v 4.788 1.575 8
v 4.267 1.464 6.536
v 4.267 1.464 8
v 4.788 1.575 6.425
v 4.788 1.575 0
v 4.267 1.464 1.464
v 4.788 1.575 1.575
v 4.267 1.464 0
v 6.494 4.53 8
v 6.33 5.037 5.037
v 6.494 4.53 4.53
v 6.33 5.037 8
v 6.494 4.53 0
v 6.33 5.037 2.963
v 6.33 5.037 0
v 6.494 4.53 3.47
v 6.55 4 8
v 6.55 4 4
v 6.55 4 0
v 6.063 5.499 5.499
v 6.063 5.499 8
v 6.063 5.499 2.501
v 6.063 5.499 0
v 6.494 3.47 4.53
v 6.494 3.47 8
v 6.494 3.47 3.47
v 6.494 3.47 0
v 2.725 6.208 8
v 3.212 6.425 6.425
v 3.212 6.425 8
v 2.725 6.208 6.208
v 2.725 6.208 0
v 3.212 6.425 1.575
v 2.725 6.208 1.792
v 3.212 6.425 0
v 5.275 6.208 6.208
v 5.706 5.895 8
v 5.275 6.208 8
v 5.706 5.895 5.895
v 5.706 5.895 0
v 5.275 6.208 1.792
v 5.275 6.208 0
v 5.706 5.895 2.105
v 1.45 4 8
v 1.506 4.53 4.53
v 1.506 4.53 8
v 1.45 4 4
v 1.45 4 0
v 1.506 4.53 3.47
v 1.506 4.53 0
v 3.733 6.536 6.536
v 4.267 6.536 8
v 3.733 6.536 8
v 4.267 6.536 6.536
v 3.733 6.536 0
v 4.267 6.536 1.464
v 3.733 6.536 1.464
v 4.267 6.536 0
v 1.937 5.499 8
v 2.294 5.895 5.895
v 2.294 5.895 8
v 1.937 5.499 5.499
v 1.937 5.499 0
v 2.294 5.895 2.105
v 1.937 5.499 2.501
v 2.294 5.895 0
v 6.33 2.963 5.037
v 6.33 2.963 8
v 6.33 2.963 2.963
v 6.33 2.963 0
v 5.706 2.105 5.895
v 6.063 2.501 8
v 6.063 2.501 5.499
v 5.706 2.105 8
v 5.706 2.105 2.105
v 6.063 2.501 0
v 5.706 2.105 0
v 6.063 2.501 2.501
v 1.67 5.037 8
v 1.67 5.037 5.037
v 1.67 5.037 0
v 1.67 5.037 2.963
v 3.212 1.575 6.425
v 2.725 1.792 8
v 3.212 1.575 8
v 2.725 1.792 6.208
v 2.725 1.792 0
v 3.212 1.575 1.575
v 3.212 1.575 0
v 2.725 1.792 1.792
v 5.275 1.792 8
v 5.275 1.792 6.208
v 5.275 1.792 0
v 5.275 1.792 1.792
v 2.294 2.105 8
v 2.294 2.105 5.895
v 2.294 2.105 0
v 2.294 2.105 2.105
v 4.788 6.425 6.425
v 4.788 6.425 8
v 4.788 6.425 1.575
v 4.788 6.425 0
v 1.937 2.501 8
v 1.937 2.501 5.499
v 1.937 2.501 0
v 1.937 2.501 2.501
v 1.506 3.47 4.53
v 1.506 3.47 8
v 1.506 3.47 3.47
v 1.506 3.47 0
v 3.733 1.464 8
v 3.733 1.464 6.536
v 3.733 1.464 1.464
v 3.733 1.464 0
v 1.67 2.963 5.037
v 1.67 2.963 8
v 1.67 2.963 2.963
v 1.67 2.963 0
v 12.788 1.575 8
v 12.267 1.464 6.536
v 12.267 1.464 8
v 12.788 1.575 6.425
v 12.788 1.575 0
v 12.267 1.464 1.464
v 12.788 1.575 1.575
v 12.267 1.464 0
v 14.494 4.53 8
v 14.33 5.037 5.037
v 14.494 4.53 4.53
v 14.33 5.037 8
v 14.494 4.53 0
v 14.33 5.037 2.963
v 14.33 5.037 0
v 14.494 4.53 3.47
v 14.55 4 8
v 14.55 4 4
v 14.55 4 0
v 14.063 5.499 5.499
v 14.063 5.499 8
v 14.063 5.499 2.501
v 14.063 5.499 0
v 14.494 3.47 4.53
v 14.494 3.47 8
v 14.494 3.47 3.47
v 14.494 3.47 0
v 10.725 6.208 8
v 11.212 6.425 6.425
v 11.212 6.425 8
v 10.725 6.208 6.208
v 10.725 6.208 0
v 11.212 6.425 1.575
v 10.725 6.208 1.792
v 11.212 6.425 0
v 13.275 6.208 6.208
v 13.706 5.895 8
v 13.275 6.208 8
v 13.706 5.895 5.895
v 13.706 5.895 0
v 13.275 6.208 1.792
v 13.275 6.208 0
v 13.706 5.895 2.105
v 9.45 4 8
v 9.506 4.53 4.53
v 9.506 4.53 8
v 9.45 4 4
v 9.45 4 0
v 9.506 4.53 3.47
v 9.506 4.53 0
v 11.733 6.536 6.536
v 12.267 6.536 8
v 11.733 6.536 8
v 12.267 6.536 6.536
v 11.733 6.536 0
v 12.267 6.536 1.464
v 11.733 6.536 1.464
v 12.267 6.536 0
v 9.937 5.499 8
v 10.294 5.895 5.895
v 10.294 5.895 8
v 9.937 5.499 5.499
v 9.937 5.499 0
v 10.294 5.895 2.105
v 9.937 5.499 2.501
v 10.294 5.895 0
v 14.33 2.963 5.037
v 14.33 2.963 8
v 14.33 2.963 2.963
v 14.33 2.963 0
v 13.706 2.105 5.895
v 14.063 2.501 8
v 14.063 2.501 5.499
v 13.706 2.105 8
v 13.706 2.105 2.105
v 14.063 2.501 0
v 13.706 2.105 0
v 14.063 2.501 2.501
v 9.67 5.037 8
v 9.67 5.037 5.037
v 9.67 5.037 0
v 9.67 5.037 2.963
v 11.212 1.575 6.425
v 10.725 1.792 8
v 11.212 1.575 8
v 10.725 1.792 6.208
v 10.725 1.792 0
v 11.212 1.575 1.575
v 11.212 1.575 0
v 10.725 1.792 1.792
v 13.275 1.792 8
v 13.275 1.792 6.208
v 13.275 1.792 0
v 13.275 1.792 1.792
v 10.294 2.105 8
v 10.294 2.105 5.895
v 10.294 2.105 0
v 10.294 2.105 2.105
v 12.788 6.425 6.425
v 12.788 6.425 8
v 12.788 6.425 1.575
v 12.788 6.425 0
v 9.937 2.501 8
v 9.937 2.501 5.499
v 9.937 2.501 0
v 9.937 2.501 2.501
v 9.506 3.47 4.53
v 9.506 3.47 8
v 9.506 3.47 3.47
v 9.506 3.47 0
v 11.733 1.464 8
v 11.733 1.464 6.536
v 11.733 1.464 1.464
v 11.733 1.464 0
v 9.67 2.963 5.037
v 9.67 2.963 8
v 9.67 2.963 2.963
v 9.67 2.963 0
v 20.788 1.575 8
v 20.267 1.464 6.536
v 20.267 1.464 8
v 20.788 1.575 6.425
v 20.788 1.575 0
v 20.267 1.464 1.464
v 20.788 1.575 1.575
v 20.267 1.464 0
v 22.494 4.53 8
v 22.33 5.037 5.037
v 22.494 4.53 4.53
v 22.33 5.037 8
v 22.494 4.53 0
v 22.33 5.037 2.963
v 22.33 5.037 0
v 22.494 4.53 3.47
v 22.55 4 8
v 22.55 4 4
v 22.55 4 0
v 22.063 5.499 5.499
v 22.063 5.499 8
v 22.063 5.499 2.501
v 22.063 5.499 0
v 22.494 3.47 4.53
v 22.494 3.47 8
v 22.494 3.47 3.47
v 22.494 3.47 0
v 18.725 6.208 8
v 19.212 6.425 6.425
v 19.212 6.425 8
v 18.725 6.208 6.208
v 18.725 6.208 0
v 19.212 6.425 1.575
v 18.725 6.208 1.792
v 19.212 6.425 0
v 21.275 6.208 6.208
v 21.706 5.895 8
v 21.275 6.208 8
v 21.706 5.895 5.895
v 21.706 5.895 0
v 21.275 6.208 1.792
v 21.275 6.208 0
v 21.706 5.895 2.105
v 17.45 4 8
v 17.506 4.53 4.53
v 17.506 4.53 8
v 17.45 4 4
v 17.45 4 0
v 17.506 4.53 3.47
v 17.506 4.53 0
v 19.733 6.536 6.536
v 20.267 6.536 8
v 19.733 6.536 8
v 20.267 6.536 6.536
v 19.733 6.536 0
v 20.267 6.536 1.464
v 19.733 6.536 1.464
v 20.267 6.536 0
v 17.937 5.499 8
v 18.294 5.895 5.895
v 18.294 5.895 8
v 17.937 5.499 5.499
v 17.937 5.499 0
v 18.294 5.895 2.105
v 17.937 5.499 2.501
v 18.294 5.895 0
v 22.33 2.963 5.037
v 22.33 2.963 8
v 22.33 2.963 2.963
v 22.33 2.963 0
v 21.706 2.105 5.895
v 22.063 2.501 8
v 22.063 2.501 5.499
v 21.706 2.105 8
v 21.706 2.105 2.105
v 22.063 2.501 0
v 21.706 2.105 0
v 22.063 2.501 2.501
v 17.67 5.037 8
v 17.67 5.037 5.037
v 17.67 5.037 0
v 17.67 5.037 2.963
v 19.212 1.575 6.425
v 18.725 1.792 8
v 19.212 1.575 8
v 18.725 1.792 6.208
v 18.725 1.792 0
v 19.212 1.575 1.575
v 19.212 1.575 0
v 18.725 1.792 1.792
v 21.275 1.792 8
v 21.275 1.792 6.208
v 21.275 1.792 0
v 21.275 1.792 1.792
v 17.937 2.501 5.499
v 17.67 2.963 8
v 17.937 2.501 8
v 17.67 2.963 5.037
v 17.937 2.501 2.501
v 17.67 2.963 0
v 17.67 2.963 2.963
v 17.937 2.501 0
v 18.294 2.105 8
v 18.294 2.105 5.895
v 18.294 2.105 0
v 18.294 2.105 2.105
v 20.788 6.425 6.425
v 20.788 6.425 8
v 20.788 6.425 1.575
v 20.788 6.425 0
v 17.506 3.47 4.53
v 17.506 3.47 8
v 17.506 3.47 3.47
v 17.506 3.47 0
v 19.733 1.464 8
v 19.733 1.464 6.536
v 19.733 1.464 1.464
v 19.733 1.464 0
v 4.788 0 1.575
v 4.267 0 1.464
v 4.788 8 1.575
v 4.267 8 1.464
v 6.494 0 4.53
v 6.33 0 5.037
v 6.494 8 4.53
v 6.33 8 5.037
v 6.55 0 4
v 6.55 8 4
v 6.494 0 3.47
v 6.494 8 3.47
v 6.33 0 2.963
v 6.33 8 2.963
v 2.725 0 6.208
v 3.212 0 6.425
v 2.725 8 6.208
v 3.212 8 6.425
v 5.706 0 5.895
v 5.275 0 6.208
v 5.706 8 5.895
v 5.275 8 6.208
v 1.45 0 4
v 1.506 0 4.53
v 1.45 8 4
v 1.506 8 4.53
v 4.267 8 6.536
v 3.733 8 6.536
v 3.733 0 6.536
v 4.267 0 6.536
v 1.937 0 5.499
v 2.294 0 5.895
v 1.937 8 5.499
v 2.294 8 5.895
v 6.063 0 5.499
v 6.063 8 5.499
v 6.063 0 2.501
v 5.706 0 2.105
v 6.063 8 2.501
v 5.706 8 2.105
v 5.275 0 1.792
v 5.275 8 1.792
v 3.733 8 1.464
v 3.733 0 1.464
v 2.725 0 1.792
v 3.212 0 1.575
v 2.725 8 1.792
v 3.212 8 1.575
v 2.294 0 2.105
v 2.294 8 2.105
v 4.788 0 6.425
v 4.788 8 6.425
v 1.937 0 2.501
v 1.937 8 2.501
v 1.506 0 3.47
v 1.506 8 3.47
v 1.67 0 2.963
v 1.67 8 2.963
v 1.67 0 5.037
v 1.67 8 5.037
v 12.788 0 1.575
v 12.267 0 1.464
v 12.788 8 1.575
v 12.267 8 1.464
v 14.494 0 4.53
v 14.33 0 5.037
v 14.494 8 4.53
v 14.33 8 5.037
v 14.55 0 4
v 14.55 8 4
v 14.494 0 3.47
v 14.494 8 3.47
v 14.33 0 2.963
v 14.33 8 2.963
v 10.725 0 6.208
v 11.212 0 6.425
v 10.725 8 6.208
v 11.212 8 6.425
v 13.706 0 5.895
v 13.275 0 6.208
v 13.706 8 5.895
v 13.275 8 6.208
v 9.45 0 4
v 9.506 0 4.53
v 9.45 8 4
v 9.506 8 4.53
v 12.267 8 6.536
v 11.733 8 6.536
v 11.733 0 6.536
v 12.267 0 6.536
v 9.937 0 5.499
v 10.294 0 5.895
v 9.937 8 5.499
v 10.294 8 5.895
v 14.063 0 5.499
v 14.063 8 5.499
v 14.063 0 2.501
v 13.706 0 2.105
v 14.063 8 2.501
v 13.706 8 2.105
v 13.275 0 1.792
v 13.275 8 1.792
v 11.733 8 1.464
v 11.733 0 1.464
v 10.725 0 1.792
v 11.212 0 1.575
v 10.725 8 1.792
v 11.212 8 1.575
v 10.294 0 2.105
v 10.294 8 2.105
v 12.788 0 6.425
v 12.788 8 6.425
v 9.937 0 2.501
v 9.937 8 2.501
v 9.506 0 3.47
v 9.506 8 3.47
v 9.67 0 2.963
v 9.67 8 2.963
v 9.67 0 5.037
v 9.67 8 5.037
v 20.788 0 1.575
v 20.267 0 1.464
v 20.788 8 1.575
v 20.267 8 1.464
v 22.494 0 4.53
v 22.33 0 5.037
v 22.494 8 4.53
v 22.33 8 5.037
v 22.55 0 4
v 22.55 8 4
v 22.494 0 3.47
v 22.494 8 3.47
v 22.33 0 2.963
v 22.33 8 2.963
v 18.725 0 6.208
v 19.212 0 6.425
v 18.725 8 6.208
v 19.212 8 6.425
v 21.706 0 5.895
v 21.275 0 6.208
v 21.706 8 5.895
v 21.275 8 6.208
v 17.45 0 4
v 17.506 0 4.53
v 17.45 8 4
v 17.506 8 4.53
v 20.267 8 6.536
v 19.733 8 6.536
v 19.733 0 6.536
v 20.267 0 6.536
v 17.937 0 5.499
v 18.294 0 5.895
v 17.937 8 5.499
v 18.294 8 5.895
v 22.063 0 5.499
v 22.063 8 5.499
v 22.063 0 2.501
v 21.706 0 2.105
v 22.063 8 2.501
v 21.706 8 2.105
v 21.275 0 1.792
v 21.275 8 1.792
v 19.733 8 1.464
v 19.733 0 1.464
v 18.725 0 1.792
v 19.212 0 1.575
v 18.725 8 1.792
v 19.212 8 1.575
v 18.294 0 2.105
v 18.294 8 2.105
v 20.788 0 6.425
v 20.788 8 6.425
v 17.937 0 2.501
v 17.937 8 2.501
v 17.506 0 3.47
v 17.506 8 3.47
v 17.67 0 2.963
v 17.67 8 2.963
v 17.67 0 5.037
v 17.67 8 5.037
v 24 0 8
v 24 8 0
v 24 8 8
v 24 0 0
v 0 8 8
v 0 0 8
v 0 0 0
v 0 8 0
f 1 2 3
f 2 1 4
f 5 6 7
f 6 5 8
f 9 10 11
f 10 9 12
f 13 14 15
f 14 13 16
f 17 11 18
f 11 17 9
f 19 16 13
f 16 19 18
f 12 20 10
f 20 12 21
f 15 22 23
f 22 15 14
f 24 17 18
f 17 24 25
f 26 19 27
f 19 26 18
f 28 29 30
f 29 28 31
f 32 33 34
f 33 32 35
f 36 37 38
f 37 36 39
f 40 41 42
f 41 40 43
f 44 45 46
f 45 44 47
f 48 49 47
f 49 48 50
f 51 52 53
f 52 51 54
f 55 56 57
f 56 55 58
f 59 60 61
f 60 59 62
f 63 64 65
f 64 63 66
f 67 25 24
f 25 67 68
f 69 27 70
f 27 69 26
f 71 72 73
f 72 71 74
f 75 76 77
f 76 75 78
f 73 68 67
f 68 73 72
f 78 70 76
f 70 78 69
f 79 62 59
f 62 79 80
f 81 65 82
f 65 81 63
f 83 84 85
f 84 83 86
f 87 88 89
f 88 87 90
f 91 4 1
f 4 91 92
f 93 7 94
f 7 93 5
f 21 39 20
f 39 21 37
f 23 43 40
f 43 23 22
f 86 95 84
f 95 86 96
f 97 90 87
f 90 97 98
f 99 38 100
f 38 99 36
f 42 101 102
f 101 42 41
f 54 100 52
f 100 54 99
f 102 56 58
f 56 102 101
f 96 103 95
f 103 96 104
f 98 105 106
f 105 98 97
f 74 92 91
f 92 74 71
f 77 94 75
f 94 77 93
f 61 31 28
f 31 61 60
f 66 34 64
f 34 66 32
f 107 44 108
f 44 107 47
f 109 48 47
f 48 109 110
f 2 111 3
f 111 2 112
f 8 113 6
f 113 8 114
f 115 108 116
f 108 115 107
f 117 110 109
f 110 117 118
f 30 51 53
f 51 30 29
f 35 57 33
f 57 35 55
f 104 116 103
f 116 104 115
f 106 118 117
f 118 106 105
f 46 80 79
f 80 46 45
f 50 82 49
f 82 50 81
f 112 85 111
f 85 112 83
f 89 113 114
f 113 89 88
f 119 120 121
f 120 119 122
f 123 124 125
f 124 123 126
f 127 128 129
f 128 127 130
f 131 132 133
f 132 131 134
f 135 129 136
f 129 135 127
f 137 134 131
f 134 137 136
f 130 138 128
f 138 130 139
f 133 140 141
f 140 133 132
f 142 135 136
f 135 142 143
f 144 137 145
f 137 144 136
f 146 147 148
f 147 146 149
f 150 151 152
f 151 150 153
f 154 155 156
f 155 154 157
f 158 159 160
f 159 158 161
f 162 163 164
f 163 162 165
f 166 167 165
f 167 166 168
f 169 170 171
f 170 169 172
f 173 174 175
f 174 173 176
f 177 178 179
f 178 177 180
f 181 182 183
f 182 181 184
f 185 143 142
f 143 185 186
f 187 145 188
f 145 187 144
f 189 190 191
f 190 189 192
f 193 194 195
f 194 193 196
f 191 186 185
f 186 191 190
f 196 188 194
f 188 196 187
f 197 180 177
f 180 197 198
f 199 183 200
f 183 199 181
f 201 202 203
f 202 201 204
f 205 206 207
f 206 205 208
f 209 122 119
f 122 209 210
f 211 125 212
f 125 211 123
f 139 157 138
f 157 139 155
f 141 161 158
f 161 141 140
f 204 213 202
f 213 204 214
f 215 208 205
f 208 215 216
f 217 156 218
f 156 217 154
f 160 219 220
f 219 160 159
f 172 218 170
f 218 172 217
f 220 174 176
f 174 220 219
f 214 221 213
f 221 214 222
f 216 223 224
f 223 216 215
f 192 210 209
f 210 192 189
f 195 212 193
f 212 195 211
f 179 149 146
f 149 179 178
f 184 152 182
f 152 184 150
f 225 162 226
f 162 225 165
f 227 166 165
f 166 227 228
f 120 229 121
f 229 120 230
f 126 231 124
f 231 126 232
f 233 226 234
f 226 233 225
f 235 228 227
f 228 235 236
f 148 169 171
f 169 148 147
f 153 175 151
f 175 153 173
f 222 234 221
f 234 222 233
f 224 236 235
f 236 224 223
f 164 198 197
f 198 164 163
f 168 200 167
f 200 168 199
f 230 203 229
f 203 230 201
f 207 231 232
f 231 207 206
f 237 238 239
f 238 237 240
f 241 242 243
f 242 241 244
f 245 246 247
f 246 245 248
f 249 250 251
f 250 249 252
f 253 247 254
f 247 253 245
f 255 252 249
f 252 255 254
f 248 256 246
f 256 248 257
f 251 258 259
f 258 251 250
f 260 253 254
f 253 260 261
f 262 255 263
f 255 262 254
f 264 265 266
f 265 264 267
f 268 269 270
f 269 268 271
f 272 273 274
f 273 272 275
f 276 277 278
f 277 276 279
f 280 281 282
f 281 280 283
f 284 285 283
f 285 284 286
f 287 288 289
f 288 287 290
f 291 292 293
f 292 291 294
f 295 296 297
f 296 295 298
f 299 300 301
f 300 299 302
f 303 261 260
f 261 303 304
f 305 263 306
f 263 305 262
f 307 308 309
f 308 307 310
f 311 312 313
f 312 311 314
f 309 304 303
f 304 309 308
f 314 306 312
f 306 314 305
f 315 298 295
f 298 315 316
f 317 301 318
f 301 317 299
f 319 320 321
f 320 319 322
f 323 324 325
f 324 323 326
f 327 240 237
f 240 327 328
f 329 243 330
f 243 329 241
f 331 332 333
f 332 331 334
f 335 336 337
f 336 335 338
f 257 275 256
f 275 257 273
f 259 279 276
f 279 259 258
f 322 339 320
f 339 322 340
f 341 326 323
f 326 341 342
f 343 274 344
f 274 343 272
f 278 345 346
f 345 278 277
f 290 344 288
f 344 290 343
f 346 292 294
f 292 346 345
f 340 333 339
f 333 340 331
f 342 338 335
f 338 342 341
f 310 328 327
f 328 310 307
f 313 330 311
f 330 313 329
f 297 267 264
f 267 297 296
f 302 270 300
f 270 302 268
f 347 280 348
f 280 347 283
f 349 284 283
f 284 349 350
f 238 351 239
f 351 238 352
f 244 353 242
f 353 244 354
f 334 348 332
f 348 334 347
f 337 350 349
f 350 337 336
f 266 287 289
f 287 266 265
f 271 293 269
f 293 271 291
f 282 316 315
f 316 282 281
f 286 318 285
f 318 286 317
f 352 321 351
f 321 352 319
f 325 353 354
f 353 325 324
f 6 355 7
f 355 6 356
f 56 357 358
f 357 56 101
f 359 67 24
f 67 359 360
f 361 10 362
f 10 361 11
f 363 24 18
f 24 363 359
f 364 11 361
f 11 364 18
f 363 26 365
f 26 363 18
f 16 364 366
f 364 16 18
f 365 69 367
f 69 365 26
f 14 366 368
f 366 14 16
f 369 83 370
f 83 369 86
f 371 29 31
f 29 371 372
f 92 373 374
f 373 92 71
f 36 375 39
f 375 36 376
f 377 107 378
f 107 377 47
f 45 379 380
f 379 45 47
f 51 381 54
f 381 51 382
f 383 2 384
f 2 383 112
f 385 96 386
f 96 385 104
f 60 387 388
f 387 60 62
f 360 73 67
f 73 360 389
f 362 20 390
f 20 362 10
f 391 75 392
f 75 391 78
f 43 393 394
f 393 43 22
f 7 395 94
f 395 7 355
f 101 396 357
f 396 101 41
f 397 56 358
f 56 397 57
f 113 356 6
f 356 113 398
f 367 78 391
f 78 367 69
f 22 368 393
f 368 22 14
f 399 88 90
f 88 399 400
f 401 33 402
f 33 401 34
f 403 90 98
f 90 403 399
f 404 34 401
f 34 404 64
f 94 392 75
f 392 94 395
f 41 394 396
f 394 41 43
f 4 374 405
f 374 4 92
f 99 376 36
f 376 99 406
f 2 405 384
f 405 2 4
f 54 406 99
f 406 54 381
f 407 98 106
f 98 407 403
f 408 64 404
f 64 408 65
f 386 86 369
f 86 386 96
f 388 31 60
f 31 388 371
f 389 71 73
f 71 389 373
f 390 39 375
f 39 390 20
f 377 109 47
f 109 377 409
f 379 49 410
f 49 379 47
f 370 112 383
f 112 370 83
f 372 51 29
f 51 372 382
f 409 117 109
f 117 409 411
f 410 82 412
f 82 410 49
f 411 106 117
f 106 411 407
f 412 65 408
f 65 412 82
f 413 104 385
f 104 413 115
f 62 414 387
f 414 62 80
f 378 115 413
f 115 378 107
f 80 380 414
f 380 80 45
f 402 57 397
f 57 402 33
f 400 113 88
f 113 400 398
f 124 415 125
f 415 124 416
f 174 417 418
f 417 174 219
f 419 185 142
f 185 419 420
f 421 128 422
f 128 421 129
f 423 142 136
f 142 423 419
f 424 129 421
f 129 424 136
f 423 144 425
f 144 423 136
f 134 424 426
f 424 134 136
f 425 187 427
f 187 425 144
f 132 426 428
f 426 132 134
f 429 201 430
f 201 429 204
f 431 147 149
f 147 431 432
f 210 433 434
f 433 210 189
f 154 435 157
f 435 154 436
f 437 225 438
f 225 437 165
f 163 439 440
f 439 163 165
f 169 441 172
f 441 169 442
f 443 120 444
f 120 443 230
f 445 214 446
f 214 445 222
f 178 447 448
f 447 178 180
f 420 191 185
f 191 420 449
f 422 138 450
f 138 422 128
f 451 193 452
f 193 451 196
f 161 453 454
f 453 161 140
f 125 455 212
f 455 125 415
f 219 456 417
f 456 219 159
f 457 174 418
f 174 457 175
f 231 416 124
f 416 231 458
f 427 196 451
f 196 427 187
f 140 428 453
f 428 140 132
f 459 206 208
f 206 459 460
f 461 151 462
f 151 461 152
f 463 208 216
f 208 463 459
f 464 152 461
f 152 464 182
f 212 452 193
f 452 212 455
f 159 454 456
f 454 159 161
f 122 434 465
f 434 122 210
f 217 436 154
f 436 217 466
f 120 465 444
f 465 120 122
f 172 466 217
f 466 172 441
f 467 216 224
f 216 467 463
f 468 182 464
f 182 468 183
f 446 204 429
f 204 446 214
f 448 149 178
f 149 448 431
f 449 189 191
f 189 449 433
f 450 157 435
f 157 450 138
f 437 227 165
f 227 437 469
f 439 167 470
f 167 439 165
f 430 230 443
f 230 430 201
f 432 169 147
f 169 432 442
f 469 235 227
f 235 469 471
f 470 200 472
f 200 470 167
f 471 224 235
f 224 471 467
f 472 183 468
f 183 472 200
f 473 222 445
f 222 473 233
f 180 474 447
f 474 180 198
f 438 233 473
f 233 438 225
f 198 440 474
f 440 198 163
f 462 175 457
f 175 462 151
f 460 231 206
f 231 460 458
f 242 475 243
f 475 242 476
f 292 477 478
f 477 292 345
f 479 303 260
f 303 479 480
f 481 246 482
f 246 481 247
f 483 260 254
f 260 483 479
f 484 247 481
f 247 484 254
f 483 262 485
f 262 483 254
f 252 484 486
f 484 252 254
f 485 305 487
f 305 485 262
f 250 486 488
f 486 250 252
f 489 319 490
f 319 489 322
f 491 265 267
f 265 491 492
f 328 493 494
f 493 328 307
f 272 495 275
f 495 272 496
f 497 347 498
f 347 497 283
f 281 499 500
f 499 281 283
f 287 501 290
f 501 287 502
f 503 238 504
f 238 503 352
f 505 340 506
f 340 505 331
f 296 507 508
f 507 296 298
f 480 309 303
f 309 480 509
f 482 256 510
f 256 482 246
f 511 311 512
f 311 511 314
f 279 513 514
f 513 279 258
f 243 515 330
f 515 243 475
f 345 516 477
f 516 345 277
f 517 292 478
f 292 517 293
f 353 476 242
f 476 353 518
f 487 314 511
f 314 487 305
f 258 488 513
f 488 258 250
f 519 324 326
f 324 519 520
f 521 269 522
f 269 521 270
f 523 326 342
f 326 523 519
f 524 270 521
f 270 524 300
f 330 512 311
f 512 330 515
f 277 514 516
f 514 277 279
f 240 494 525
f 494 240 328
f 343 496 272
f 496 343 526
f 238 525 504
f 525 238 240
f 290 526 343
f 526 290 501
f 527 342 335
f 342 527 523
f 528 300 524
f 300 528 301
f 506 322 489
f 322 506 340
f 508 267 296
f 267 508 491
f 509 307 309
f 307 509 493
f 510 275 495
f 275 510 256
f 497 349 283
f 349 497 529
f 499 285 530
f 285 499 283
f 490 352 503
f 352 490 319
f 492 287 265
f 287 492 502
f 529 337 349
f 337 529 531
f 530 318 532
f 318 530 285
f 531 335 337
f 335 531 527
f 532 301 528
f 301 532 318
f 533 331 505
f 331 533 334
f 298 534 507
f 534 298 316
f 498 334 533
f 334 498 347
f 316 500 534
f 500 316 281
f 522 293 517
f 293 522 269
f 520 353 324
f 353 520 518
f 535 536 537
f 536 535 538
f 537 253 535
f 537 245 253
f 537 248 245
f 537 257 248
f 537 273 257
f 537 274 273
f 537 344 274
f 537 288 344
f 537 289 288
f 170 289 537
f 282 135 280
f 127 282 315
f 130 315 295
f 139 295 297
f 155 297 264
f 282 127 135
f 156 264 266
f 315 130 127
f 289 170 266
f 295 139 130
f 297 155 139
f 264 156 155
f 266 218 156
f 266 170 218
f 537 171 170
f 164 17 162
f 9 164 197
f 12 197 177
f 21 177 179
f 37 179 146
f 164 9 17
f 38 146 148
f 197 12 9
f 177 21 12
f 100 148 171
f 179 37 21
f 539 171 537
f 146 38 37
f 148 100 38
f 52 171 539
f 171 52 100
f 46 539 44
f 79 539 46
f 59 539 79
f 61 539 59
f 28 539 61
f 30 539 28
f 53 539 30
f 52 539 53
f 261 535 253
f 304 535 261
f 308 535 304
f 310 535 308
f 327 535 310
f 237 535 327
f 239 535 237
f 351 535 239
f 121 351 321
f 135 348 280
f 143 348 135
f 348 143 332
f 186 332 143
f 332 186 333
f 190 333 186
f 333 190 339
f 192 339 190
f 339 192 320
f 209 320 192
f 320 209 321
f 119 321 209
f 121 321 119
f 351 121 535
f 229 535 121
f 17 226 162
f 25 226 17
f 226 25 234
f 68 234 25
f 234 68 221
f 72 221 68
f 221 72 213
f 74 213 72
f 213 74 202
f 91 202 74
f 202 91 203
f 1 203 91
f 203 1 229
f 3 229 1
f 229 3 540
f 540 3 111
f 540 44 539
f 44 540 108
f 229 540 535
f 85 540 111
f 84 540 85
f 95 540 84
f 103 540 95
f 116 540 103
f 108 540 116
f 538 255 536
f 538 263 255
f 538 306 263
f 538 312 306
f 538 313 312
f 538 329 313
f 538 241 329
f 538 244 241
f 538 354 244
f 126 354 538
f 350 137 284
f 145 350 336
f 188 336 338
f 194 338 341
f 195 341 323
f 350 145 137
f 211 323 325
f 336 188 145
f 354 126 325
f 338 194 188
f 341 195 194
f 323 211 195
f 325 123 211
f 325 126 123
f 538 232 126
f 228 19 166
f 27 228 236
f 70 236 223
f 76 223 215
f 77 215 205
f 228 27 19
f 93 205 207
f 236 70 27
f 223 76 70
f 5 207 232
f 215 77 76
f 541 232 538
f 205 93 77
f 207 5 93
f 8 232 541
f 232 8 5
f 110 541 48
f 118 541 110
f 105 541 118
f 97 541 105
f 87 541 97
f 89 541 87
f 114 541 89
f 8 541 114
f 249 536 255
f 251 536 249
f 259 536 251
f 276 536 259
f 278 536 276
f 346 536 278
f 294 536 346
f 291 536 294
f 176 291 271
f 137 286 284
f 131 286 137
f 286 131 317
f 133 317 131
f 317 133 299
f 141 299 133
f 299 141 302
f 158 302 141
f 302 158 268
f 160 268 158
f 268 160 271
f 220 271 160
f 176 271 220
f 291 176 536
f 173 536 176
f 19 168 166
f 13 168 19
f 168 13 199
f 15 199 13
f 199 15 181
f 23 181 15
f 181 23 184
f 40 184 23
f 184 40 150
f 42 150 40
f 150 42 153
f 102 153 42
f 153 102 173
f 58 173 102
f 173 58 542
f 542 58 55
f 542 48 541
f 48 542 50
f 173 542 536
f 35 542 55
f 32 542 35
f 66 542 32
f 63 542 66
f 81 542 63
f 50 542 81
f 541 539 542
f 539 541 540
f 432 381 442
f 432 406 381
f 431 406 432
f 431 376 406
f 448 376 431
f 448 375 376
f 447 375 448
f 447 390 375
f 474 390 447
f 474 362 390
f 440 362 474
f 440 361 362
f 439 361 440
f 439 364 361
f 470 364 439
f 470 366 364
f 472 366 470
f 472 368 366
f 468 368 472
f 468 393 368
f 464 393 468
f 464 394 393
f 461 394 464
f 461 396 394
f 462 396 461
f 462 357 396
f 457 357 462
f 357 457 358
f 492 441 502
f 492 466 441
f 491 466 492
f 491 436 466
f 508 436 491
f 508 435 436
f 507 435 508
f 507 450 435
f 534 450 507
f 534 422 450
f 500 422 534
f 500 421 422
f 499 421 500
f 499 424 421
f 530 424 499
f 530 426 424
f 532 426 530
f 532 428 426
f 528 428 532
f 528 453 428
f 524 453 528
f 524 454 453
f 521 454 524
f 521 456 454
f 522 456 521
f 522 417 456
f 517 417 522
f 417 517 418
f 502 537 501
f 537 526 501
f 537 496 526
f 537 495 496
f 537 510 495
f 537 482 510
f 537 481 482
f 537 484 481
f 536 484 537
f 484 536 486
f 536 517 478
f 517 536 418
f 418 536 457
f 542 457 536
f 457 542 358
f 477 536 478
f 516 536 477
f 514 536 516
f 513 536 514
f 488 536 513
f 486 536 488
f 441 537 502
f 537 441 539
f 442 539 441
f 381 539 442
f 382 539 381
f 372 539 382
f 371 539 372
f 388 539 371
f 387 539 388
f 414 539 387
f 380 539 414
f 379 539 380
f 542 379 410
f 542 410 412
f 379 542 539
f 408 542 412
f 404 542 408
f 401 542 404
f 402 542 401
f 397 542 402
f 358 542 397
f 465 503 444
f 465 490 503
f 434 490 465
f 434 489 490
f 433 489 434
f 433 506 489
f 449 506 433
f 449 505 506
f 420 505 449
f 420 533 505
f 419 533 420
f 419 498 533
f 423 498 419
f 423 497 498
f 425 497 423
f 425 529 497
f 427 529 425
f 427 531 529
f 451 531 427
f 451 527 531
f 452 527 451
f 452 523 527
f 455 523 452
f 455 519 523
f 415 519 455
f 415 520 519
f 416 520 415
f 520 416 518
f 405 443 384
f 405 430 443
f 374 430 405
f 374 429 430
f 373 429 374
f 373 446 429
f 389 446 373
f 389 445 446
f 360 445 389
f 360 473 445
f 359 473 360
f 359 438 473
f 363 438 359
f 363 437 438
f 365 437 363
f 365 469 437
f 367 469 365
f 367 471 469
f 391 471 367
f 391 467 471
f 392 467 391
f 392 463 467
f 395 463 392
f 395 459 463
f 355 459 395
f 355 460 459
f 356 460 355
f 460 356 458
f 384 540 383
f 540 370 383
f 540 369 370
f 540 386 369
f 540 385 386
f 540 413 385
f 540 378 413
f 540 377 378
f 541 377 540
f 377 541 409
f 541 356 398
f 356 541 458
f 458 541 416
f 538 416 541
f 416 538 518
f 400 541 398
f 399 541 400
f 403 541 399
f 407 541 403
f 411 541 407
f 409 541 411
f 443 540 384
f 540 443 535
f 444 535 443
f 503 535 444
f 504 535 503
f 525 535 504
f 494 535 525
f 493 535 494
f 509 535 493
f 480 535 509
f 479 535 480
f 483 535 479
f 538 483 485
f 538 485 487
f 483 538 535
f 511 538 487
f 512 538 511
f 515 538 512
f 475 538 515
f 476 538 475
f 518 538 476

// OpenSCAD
// [FL_INDEX: keywords="openscad, 3d_parametric, The_Original_Bitbeam, csg_solid" | COT="Parametric OpenSCAD design from 3DCodeverse"]
// Title: The Original Bitbeam

// Description: "LEGO Technic-compatible gridbeam"
// Project home: http://bitbeam.org

// Each bitbeam is 8mm inches wide. 
// Center of each hole is 8mm apart from each other
// Holes are 5.1 mm in diameter.

// Mini
//beam_width     = 4;
//hole_diameter  = 2.2;

// Standard
beam_width     = 8;
hole_diameter  = 5.1;

hole_radius    = hole_diameter / 2;

module beam(number_of_holes) {
    beam_length = number_of_holes * beam_width;
    difference() {
        // Draw the beam...
        cube([beam_length,beam_width,beam_width]);
    
        // Cut the holes...
        for (x=[beam_width/2 : beam_width : beam_length]) {
            translate([x,beam_width/2,-2])
            cylinder(r=hole_radius, h=12, $fn=30);
        }
        for (x=[beam_width/2 : beam_width : beam_length]) {
            rotate([90,0,0])
            translate([x,beam_width/2,-10])
            cylinder(r=hole_radius, h=12, $fn=30);
        }

        // Optional through-hole
        //rotate([0,90,0])
        //translate([-4,beam_width/2,-2])
        //cylinder(r=hole_radius, h=number_of_holes*beam_width+4, $fn=30);
        }
}

beam(3);
